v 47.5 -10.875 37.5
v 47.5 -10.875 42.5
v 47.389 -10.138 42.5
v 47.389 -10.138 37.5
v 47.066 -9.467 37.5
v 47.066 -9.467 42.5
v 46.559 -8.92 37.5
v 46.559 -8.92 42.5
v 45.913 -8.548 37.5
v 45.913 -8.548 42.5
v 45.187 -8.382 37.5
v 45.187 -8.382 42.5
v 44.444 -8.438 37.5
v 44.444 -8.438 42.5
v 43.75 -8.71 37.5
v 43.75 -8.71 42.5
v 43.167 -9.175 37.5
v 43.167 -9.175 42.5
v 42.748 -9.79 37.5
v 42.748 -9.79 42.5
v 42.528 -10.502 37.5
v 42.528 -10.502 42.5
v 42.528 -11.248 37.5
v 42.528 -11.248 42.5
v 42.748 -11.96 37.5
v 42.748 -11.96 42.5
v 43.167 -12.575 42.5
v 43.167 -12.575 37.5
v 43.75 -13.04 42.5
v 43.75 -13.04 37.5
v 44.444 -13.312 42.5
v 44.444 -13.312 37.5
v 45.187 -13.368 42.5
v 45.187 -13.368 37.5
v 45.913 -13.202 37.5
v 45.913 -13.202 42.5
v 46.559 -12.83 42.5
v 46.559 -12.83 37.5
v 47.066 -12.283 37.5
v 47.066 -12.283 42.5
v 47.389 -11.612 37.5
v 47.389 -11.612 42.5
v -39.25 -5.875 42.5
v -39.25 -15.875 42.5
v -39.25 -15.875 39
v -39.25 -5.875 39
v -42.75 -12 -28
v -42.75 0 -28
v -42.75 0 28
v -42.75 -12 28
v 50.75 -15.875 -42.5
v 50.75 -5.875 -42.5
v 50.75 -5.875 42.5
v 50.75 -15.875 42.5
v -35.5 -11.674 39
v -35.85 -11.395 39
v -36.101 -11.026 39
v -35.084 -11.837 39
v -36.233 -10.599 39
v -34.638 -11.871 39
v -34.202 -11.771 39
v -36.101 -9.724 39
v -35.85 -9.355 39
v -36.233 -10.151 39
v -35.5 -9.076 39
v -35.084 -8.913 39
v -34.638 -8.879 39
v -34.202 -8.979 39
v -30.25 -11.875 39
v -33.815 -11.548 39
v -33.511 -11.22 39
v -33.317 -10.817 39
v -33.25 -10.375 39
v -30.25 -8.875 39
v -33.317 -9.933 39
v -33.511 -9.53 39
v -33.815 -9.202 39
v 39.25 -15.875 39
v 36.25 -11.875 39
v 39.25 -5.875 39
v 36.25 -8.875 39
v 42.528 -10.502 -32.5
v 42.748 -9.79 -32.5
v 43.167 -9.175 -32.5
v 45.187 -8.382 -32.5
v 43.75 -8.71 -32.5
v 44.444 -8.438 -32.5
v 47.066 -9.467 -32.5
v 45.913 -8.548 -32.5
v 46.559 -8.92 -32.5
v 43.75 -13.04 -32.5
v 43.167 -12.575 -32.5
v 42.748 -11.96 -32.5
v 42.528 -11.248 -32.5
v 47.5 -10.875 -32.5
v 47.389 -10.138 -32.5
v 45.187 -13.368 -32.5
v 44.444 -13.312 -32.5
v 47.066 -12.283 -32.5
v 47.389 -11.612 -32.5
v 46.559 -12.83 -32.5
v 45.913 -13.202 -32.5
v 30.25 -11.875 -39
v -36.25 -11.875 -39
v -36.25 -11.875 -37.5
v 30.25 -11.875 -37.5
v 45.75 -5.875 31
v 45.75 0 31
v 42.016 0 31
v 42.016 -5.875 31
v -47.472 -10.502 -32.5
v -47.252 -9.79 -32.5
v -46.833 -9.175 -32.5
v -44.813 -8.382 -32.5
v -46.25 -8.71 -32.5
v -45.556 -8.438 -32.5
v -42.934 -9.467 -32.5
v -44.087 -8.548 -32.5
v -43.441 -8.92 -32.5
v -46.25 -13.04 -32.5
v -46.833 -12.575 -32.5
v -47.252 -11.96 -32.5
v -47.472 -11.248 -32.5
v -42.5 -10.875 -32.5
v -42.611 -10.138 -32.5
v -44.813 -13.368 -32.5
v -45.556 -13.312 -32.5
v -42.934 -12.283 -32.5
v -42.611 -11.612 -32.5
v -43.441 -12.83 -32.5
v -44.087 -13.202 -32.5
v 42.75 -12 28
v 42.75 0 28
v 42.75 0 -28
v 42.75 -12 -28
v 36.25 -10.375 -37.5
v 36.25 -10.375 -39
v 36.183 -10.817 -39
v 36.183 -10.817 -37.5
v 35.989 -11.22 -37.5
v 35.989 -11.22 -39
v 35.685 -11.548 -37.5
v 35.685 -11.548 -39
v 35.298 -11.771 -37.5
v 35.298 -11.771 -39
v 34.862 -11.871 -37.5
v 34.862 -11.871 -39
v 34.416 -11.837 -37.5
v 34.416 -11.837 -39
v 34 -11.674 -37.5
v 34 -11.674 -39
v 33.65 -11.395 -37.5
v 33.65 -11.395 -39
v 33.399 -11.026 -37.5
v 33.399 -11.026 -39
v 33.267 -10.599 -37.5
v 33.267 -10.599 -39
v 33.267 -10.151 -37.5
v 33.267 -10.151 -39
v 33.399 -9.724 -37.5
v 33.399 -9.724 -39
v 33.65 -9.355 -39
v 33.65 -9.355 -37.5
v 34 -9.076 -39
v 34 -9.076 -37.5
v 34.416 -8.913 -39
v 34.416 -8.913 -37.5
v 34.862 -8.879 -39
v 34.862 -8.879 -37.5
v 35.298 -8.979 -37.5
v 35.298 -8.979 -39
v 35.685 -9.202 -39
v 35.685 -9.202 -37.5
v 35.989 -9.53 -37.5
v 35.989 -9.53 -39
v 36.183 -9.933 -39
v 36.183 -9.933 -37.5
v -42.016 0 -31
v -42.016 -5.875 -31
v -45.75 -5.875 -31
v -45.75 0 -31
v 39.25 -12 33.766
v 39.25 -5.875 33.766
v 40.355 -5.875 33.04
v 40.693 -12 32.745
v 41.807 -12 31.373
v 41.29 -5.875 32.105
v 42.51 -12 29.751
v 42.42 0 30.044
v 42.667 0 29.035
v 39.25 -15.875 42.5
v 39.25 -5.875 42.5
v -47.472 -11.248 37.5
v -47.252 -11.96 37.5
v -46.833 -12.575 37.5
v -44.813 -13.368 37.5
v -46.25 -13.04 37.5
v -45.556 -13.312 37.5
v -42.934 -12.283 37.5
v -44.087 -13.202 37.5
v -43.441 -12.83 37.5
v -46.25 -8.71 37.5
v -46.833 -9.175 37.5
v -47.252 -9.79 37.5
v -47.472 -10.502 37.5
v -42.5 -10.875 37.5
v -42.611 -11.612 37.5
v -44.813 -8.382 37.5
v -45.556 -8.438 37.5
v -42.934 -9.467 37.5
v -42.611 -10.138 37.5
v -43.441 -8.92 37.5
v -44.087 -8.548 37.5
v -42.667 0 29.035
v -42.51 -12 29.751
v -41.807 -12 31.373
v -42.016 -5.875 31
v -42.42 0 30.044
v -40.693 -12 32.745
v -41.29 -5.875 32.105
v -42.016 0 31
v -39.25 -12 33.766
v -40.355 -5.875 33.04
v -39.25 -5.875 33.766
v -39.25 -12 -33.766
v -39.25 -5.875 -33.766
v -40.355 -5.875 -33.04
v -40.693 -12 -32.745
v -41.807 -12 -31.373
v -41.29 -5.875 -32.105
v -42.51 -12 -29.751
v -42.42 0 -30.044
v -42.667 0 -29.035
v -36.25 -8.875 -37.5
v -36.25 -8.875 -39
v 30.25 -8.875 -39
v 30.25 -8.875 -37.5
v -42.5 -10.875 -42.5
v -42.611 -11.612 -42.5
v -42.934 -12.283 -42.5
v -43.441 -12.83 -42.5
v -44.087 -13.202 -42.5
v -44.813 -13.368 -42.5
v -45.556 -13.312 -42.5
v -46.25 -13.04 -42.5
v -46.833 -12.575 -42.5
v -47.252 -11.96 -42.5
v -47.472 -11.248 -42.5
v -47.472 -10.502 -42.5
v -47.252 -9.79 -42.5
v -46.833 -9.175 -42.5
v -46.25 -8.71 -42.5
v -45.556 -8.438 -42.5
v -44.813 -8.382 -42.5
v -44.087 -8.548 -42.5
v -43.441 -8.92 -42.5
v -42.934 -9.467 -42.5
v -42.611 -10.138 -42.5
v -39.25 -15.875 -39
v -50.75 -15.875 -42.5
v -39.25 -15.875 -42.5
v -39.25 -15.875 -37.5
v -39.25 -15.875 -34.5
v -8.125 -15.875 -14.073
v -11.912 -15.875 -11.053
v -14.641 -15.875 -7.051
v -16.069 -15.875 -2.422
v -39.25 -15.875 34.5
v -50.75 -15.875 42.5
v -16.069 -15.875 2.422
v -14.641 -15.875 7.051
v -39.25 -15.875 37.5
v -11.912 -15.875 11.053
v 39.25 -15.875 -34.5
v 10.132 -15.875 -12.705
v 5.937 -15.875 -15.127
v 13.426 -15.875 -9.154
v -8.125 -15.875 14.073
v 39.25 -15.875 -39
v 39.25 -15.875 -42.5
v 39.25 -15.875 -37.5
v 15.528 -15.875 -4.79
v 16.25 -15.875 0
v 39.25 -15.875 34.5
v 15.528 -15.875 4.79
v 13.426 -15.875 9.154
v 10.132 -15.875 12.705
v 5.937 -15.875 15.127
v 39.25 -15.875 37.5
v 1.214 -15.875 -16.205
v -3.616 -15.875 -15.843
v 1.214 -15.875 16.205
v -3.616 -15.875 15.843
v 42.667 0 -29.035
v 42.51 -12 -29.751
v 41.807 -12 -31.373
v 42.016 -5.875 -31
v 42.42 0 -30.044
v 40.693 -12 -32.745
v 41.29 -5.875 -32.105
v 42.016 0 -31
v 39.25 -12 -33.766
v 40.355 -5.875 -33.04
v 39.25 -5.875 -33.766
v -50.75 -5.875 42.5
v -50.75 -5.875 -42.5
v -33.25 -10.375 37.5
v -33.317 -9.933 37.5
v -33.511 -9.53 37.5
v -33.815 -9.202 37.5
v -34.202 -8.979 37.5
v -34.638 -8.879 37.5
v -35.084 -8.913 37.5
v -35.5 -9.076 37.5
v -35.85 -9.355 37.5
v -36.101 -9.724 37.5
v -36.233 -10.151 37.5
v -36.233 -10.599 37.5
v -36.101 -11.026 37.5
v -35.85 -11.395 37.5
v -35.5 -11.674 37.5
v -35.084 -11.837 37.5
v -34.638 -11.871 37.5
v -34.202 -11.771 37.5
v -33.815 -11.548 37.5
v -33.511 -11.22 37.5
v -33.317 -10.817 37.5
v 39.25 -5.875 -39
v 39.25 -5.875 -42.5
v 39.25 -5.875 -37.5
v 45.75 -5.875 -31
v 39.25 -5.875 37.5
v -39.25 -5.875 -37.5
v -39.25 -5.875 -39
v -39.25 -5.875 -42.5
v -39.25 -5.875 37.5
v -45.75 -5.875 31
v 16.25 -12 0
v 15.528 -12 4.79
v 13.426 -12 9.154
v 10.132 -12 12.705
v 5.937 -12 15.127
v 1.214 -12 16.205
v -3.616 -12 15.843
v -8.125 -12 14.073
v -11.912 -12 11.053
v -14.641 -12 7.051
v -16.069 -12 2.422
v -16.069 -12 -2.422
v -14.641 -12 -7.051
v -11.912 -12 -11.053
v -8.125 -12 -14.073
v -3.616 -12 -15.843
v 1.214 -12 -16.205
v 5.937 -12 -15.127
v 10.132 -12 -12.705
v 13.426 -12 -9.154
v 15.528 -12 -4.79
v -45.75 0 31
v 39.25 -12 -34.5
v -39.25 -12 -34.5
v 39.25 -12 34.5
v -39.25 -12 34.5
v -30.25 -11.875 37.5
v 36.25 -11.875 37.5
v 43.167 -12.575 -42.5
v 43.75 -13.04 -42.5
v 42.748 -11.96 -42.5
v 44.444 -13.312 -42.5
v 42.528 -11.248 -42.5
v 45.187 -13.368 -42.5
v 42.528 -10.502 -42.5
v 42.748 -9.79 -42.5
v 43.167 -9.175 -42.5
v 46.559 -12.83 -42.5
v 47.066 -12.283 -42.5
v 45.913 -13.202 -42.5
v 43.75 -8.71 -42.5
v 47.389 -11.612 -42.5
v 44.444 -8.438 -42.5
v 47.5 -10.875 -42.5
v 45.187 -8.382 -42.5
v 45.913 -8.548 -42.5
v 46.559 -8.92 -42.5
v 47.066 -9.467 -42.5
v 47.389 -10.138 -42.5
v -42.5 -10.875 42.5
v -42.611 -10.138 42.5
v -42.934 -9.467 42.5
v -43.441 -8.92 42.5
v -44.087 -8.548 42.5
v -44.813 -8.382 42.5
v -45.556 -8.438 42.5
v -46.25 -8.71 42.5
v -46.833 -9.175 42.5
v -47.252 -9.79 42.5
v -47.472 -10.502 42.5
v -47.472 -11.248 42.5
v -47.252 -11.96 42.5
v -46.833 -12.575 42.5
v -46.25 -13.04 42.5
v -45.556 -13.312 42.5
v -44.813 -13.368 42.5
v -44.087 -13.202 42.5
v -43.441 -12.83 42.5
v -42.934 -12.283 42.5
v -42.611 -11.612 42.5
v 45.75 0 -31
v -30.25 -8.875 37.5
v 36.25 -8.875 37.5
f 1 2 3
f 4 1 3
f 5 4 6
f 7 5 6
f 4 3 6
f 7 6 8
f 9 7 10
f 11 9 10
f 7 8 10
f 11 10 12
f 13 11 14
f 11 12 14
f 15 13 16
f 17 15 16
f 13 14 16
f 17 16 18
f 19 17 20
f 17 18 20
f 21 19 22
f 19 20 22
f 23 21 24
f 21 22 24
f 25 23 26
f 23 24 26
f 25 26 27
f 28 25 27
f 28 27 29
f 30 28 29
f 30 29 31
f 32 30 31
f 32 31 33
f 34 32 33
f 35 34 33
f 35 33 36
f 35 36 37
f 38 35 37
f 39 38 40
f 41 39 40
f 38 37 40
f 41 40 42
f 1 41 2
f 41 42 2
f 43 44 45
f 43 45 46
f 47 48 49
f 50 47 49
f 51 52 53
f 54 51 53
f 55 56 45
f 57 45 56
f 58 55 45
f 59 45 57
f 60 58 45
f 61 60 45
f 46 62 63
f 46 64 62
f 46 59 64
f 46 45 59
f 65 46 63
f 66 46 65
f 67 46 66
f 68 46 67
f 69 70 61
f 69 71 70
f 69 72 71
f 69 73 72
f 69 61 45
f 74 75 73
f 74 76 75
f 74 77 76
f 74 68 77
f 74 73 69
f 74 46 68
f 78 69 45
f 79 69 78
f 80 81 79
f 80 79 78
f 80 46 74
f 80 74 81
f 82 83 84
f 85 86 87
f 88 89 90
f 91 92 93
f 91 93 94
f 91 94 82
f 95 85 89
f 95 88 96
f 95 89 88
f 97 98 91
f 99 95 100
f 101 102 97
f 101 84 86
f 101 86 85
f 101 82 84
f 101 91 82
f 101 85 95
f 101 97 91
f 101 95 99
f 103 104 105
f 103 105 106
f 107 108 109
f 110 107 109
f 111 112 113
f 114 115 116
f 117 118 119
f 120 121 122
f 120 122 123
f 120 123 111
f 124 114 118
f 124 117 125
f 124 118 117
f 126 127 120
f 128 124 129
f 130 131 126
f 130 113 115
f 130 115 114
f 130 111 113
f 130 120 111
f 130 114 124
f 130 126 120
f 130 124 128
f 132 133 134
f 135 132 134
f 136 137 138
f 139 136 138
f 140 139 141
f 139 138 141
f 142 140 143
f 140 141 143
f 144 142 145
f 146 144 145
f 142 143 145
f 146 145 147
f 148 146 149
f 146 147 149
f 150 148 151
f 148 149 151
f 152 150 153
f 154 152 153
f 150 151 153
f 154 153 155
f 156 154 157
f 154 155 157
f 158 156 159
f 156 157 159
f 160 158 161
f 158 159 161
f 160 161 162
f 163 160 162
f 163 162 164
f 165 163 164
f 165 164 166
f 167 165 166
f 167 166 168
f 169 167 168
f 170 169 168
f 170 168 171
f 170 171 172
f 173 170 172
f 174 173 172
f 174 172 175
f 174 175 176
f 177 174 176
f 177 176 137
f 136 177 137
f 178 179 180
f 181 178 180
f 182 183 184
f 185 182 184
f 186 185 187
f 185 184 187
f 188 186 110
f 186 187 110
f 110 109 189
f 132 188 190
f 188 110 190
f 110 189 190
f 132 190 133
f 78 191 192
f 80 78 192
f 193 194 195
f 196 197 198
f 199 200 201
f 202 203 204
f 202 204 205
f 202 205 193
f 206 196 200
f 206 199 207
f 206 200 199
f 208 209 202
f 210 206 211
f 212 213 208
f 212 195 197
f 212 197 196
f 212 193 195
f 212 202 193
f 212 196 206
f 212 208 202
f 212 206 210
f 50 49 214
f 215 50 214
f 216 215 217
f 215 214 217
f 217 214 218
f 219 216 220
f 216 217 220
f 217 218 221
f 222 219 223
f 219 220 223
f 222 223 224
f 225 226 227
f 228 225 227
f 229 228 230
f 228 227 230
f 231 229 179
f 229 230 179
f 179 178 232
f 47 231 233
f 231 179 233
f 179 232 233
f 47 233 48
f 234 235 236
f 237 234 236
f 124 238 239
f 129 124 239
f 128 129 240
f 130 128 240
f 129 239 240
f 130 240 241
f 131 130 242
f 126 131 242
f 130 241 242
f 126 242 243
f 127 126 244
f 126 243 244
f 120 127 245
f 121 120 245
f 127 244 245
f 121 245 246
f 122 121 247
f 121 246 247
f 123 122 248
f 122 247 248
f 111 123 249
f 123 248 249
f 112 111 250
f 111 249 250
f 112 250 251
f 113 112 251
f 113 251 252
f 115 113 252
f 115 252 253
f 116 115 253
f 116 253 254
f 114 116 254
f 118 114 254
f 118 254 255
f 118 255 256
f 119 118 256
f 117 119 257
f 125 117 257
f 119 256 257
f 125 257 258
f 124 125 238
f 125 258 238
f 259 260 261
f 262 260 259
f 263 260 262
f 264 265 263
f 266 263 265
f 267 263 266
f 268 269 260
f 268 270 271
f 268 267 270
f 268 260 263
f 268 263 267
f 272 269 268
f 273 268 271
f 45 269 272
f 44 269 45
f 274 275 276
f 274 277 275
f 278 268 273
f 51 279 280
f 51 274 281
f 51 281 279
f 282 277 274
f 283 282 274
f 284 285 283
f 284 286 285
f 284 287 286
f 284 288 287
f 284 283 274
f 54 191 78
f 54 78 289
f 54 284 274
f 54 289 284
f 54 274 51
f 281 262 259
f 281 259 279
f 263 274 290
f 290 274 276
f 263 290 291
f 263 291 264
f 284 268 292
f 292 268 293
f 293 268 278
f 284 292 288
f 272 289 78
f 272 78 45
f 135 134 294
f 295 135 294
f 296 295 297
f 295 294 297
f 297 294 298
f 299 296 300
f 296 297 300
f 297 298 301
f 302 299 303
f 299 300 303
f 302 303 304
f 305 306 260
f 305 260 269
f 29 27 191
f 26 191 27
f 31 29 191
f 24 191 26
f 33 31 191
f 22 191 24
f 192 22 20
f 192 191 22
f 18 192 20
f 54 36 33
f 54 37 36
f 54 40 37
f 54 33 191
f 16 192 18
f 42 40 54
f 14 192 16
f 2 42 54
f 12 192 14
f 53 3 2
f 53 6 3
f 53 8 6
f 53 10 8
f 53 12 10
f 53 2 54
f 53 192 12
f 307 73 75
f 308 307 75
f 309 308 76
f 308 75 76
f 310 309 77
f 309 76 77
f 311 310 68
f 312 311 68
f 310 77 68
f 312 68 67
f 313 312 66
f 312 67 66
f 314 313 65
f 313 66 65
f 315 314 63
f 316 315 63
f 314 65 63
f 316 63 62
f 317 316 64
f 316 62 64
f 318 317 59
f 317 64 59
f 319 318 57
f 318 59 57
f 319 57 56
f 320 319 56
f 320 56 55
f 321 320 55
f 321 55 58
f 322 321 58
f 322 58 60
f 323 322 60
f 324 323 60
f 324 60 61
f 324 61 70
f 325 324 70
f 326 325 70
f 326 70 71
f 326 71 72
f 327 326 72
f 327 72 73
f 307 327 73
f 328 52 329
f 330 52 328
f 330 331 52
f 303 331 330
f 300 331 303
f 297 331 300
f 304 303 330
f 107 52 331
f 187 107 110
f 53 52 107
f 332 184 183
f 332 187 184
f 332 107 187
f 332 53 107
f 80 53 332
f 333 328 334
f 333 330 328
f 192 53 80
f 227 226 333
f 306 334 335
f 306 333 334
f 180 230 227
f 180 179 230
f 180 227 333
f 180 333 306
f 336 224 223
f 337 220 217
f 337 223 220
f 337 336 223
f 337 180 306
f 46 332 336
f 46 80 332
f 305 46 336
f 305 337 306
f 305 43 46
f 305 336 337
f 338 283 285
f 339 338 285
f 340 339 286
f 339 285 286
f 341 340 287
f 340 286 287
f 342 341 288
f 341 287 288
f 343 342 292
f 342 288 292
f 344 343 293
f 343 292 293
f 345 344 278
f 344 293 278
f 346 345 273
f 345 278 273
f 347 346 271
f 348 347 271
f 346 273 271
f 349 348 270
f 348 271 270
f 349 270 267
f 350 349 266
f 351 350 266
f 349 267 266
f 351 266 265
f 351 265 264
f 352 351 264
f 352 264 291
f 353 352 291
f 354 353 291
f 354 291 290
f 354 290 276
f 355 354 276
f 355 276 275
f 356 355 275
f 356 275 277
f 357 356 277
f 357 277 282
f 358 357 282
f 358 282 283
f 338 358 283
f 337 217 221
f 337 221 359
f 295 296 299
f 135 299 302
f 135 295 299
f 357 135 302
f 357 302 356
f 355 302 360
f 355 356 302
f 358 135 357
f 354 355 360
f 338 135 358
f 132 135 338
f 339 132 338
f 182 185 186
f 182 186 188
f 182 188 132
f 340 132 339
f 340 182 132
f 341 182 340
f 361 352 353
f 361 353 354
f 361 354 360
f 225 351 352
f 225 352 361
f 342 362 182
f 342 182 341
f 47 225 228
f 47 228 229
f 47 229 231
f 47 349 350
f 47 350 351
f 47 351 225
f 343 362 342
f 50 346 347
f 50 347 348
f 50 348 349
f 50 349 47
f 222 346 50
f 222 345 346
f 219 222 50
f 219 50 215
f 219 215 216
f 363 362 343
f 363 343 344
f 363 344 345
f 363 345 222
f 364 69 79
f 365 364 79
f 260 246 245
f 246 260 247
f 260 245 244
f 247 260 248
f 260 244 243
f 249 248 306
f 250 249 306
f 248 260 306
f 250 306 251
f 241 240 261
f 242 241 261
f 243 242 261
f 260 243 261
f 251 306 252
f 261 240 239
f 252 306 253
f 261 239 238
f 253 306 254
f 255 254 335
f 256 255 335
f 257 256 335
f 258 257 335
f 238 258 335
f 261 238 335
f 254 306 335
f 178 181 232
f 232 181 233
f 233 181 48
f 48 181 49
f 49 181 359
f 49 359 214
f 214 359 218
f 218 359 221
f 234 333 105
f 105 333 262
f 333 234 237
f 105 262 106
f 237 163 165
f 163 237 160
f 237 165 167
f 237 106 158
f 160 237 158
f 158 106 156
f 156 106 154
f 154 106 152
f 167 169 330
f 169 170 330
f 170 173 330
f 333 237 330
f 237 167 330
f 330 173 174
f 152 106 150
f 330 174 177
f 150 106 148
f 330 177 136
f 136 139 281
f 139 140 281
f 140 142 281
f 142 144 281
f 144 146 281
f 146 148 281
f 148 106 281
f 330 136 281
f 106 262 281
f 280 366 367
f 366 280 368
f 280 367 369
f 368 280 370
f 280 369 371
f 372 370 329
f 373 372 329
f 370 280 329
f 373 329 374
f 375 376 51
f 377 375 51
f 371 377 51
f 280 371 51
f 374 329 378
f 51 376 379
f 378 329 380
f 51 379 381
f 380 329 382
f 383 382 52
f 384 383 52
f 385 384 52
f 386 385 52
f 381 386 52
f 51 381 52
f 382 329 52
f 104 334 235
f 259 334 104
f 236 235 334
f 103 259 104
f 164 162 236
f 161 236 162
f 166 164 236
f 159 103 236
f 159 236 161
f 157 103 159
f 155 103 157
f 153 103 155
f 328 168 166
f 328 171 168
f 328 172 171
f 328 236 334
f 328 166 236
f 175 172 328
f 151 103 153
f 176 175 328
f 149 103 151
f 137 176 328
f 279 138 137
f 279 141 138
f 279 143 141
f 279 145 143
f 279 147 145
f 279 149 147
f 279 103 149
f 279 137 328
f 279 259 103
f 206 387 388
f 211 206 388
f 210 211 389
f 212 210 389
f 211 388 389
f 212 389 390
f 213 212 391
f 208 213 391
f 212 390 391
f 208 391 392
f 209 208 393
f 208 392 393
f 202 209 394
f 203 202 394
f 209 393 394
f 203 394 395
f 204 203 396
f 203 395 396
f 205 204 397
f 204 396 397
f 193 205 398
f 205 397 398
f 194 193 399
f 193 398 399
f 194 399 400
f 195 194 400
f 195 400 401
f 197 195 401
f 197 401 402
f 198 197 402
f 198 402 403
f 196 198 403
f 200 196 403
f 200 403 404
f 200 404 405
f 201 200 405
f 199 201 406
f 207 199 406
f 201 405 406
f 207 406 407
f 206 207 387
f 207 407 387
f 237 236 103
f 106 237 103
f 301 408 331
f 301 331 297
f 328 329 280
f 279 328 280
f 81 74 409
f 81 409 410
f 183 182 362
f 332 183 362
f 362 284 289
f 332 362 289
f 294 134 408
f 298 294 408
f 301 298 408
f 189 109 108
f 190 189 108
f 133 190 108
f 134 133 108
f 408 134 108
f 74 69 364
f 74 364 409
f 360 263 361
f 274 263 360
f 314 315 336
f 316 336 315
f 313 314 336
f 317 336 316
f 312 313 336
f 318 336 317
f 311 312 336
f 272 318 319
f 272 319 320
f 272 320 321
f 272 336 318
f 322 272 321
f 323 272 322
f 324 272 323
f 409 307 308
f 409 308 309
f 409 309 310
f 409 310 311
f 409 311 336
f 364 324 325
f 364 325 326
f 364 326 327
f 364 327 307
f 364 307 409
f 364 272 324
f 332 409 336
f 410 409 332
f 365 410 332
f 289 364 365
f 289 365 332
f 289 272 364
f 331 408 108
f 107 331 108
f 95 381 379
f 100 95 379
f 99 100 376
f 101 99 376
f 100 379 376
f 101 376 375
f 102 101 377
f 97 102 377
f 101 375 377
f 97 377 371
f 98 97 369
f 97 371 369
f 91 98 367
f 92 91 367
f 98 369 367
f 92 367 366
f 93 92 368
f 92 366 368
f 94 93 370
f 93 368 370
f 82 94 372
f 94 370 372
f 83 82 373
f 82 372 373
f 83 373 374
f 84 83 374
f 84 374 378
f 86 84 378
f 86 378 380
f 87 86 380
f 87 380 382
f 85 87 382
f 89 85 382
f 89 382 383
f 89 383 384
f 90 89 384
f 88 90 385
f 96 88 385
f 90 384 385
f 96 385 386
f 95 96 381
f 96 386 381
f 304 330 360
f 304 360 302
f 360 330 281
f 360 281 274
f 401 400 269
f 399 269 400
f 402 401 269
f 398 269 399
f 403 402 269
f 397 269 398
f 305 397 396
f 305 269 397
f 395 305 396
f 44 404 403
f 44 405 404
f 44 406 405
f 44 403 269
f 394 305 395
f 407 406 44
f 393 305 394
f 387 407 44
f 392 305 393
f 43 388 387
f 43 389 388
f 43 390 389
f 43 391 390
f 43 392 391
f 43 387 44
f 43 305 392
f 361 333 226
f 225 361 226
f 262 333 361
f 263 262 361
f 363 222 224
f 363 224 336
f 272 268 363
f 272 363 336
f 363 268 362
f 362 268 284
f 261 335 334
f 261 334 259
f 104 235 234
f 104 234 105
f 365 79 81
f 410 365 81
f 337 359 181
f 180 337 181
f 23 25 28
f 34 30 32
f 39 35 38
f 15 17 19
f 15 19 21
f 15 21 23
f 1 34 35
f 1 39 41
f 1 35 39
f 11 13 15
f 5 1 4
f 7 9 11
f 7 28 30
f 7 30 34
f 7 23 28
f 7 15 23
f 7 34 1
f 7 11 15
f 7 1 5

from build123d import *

# Parameters (mm, degrees)
F0_W      = 101.5
F0_H      = 85
F1_DEPTH  = 15.875
F2_R      = 16.25
F3_DEPTH  = 25
F4_W      = 101.5
F4_H      = 85
F5_DEPTH  = 5.875
F7_DEPTH  = 12
F8_W      = 78.5
F8_H      = 10
F9_DEPTH  = 3.5
F10_W     = 78.5
F10_H     = 10
F11_DEPTH = 3.5
F12_W     = 78.5
F12_H     = 3
F13_DEPTH = 25
F14_W     = 78.5
F14_H     = 17.569206
F15_DEPTH = 200
F16_W     = 78.5
F16_H     = 75
F17_DEPTH = 6.125
F18_R     = 1.5
F18_W     = 66.5
F18_H     = 3
F19_DEPTH = 2
F20_R     = 1.5
F20_W     = 66.5
F20_H     = 3
F21_DEPTH = 2
F22_R     = 2.5
F23_DEPTH = 10
F24_R     = 2.5
F25_DEPTH = 10
F26_R     = 2.5
F27_DEPTH = 5
F28_R     = 2.5
F29_DEPTH = 5
F30_W     = 91.57778
F30_H     = 6.951566
F30_W_2   = 93.047712
F30_H_2   = 9.166792
F31_DEPTH = 5.875


with BuildPart() as f1:
    # F0 (on Front) → F1 (new body)
    with BuildSketch(Plane.XZ):
        Rectangle(F0_W, F0_H)
    extrude(amount=F1_DEPTH)

    # F2 (on face) → F3 (cut)
    with BuildSketch(Plane.XZ.offset(15.875)):
        Circle(F2_R)
    extrude(amount=-F3_DEPTH, mode=Mode.SUBTRACT)

    # F4 (on face) → F5 (cut)
    with BuildSketch(Plane(origin=(0, 0, 0), x_dir=(-1, 0, 0), z_dir=(0, 1, 0))):
        Rectangle(F4_W, F4_H)
        with BuildLine():
            Line((-45.75, -31), (-45.75, 31))
            ThreePointArc((-45.75, 31), (-43.846194, 35.596194), (-39.25, 37.5))
            Line((-39.25, 37.5), (39.25, 37.5))
            ThreePointArc((39.25, 37.5), (43.846194, 35.596194), (45.75, 31))
            Line((45.75, 31), (45.75, -31))
            ThreePointArc((45.75, -31), (43.846194, -35.596194), (39.25, -37.5))
            Line((39.25, -37.5), (-39.25, -37.5))
            ThreePointArc((-39.25, -37.5), (-43.846194, -35.596194), (-45.75, -31))
        make_face(mode=Mode.SUBTRACT)
    extrude(amount=-F5_DEPTH, mode=Mode.SUBTRACT)

    # F6 (on face) → F7 (cut)
    with BuildSketch(Plane(origin=(0, 0, 0), x_dir=(-1, 0, 0), z_dir=(0, 1, 0))):
        with BuildLine():
            ThreePointArc((-36.25, 34.5), (-40.846194, 32.596194), (-42.75, 28))
            Line((-42.75, 28), (-42.75, -28))
            ThreePointArc((-42.75, -28), (-40.846194, -32.596194), (-36.25, -34.5))
            Line((-36.25, -34.5), (36.25, -34.5))
            ThreePointArc((36.25, -34.5), (40.846194, -32.596194), (42.75, -28))
            Line((42.75, -28), (42.75, 28))
            ThreePointArc((42.75, 28), (40.846194, 32.596194), (36.25, 34.5))
            Line((36.25, 34.5), (-36.25, 34.5))
        make_face()
    extrude(amount=-F7_DEPTH, mode=Mode.SUBTRACT)

    # F8 (on face) → F9 (cut)
    with BuildSketch(Plane.XY.offset(42.5)):
        with Locations((0, -10.875)):
            Rectangle(F8_W, F8_H)
    extrude(amount=-F9_DEPTH, mode=Mode.SUBTRACT)

    # F10 (on face) → F11 (cut)
    with BuildSketch(Plane(origin=(0, 0, -42.5), x_dir=(1, 0, 0), z_dir=(0, 0, -1))):
        with Locations((0, 10.875)):
            Rectangle(F10_W, F10_H)
    extrude(amount=-F11_DEPTH, mode=Mode.SUBTRACT)

    # F12 (on face) → F13 (cut)
    with BuildSketch(Plane.XZ.offset(15.875)):
        with Locations((0, 36)):
            Rectangle(F12_W, F12_H)
        with Locations((0, -36)):
            Rectangle(F12_W, F12_H)
    extrude(amount=-F13_DEPTH, mode=Mode.SUBTRACT)

    # F14 (on face) → F15 (cut)
    with BuildSketch(Plane.XY.offset(39)):
        with Locations((0, 2.909603)):
            Rectangle(F14_W, F14_H)
    extrude(amount=-F15_DEPTH, mode=Mode.SUBTRACT)

    # F16 (on face) → F17 (cut)
    with BuildSketch(Plane(origin=(0, -5.875, 0), x_dir=(-1, 0, 0), z_dir=(0, 1, 0))):
        Rectangle(F16_W, F16_H)
    extrude(amount=-F17_DEPTH, mode=Mode.SUBTRACT)

    # F18 (on face) → F19 (cut)
    with BuildSketch(Plane.XY.offset(39)):
        with Locations((-34.75, -10.375)):
            Circle(F18_R)
        with Locations((3, -10.375)):
            Rectangle(F18_W, F18_H)
    extrude(amount=-F19_DEPTH, mode=Mode.SUBTRACT)

    # F20 (on face) → F21 (cut)
    with BuildSketch(Plane(origin=(0, 0, -39), x_dir=(1, 0, 0), z_dir=(0, 0, -1))):
        with Locations((34.75, 10.375)):
            Circle(F20_R)
        with Locations((-3, 10.375)):
            Rectangle(F20_W, F20_H)
    extrude(amount=-F21_DEPTH, mode=Mode.SUBTRACT)

    # F22 (on face) → F23 (cut)
    with BuildSketch(Plane(origin=(0, 0, -42.5), x_dir=(1, 0, 0), z_dir=(0, 0, -1))):
        with Locations((-45, 10.875)):
            Circle(F22_R)
    extrude(amount=-F23_DEPTH, mode=Mode.SUBTRACT)

    # F24 (on face) → F25 (cut)
    with BuildSketch(Plane(origin=(0, 0, -42.5), x_dir=(1, 0, 0), z_dir=(0, 0, -1))):
        with Locations((45, 10.875)):
            Circle(F24_R)
    extrude(amount=-F25_DEPTH, mode=Mode.SUBTRACT)

    # F26 (on face) → F27 (cut)
    with BuildSketch(Plane.XY.offset(42.5)):
        with Locations((-45, -10.875)):
            Circle(F26_R)
    extrude(amount=-F27_DEPTH, mode=Mode.SUBTRACT)

    # F28 (on face) → F29 (cut)
    with BuildSketch(Plane.XY.offset(42.5)):
        with Locations((45, -10.875)):
            Circle(F28_R)
    extrude(amount=-F29_DEPTH, mode=Mode.SUBTRACT)

    # F30 (on face) → F31 (cut)
    with BuildSketch(Plane(origin=(0, 0, 0), x_dir=(-1, 0, 0), z_dir=(0, 1, 0))):
        with Locations((0.03889, 34.475783)):
            Rectangle(F30_W, F30_H)
        with Locations((0.773856, -35.583396)):
            Rectangle(F30_W_2, F30_H_2)
    extrude(amount=-F31_DEPTH, mode=Mode.SUBTRACT)


solid = f1.part
